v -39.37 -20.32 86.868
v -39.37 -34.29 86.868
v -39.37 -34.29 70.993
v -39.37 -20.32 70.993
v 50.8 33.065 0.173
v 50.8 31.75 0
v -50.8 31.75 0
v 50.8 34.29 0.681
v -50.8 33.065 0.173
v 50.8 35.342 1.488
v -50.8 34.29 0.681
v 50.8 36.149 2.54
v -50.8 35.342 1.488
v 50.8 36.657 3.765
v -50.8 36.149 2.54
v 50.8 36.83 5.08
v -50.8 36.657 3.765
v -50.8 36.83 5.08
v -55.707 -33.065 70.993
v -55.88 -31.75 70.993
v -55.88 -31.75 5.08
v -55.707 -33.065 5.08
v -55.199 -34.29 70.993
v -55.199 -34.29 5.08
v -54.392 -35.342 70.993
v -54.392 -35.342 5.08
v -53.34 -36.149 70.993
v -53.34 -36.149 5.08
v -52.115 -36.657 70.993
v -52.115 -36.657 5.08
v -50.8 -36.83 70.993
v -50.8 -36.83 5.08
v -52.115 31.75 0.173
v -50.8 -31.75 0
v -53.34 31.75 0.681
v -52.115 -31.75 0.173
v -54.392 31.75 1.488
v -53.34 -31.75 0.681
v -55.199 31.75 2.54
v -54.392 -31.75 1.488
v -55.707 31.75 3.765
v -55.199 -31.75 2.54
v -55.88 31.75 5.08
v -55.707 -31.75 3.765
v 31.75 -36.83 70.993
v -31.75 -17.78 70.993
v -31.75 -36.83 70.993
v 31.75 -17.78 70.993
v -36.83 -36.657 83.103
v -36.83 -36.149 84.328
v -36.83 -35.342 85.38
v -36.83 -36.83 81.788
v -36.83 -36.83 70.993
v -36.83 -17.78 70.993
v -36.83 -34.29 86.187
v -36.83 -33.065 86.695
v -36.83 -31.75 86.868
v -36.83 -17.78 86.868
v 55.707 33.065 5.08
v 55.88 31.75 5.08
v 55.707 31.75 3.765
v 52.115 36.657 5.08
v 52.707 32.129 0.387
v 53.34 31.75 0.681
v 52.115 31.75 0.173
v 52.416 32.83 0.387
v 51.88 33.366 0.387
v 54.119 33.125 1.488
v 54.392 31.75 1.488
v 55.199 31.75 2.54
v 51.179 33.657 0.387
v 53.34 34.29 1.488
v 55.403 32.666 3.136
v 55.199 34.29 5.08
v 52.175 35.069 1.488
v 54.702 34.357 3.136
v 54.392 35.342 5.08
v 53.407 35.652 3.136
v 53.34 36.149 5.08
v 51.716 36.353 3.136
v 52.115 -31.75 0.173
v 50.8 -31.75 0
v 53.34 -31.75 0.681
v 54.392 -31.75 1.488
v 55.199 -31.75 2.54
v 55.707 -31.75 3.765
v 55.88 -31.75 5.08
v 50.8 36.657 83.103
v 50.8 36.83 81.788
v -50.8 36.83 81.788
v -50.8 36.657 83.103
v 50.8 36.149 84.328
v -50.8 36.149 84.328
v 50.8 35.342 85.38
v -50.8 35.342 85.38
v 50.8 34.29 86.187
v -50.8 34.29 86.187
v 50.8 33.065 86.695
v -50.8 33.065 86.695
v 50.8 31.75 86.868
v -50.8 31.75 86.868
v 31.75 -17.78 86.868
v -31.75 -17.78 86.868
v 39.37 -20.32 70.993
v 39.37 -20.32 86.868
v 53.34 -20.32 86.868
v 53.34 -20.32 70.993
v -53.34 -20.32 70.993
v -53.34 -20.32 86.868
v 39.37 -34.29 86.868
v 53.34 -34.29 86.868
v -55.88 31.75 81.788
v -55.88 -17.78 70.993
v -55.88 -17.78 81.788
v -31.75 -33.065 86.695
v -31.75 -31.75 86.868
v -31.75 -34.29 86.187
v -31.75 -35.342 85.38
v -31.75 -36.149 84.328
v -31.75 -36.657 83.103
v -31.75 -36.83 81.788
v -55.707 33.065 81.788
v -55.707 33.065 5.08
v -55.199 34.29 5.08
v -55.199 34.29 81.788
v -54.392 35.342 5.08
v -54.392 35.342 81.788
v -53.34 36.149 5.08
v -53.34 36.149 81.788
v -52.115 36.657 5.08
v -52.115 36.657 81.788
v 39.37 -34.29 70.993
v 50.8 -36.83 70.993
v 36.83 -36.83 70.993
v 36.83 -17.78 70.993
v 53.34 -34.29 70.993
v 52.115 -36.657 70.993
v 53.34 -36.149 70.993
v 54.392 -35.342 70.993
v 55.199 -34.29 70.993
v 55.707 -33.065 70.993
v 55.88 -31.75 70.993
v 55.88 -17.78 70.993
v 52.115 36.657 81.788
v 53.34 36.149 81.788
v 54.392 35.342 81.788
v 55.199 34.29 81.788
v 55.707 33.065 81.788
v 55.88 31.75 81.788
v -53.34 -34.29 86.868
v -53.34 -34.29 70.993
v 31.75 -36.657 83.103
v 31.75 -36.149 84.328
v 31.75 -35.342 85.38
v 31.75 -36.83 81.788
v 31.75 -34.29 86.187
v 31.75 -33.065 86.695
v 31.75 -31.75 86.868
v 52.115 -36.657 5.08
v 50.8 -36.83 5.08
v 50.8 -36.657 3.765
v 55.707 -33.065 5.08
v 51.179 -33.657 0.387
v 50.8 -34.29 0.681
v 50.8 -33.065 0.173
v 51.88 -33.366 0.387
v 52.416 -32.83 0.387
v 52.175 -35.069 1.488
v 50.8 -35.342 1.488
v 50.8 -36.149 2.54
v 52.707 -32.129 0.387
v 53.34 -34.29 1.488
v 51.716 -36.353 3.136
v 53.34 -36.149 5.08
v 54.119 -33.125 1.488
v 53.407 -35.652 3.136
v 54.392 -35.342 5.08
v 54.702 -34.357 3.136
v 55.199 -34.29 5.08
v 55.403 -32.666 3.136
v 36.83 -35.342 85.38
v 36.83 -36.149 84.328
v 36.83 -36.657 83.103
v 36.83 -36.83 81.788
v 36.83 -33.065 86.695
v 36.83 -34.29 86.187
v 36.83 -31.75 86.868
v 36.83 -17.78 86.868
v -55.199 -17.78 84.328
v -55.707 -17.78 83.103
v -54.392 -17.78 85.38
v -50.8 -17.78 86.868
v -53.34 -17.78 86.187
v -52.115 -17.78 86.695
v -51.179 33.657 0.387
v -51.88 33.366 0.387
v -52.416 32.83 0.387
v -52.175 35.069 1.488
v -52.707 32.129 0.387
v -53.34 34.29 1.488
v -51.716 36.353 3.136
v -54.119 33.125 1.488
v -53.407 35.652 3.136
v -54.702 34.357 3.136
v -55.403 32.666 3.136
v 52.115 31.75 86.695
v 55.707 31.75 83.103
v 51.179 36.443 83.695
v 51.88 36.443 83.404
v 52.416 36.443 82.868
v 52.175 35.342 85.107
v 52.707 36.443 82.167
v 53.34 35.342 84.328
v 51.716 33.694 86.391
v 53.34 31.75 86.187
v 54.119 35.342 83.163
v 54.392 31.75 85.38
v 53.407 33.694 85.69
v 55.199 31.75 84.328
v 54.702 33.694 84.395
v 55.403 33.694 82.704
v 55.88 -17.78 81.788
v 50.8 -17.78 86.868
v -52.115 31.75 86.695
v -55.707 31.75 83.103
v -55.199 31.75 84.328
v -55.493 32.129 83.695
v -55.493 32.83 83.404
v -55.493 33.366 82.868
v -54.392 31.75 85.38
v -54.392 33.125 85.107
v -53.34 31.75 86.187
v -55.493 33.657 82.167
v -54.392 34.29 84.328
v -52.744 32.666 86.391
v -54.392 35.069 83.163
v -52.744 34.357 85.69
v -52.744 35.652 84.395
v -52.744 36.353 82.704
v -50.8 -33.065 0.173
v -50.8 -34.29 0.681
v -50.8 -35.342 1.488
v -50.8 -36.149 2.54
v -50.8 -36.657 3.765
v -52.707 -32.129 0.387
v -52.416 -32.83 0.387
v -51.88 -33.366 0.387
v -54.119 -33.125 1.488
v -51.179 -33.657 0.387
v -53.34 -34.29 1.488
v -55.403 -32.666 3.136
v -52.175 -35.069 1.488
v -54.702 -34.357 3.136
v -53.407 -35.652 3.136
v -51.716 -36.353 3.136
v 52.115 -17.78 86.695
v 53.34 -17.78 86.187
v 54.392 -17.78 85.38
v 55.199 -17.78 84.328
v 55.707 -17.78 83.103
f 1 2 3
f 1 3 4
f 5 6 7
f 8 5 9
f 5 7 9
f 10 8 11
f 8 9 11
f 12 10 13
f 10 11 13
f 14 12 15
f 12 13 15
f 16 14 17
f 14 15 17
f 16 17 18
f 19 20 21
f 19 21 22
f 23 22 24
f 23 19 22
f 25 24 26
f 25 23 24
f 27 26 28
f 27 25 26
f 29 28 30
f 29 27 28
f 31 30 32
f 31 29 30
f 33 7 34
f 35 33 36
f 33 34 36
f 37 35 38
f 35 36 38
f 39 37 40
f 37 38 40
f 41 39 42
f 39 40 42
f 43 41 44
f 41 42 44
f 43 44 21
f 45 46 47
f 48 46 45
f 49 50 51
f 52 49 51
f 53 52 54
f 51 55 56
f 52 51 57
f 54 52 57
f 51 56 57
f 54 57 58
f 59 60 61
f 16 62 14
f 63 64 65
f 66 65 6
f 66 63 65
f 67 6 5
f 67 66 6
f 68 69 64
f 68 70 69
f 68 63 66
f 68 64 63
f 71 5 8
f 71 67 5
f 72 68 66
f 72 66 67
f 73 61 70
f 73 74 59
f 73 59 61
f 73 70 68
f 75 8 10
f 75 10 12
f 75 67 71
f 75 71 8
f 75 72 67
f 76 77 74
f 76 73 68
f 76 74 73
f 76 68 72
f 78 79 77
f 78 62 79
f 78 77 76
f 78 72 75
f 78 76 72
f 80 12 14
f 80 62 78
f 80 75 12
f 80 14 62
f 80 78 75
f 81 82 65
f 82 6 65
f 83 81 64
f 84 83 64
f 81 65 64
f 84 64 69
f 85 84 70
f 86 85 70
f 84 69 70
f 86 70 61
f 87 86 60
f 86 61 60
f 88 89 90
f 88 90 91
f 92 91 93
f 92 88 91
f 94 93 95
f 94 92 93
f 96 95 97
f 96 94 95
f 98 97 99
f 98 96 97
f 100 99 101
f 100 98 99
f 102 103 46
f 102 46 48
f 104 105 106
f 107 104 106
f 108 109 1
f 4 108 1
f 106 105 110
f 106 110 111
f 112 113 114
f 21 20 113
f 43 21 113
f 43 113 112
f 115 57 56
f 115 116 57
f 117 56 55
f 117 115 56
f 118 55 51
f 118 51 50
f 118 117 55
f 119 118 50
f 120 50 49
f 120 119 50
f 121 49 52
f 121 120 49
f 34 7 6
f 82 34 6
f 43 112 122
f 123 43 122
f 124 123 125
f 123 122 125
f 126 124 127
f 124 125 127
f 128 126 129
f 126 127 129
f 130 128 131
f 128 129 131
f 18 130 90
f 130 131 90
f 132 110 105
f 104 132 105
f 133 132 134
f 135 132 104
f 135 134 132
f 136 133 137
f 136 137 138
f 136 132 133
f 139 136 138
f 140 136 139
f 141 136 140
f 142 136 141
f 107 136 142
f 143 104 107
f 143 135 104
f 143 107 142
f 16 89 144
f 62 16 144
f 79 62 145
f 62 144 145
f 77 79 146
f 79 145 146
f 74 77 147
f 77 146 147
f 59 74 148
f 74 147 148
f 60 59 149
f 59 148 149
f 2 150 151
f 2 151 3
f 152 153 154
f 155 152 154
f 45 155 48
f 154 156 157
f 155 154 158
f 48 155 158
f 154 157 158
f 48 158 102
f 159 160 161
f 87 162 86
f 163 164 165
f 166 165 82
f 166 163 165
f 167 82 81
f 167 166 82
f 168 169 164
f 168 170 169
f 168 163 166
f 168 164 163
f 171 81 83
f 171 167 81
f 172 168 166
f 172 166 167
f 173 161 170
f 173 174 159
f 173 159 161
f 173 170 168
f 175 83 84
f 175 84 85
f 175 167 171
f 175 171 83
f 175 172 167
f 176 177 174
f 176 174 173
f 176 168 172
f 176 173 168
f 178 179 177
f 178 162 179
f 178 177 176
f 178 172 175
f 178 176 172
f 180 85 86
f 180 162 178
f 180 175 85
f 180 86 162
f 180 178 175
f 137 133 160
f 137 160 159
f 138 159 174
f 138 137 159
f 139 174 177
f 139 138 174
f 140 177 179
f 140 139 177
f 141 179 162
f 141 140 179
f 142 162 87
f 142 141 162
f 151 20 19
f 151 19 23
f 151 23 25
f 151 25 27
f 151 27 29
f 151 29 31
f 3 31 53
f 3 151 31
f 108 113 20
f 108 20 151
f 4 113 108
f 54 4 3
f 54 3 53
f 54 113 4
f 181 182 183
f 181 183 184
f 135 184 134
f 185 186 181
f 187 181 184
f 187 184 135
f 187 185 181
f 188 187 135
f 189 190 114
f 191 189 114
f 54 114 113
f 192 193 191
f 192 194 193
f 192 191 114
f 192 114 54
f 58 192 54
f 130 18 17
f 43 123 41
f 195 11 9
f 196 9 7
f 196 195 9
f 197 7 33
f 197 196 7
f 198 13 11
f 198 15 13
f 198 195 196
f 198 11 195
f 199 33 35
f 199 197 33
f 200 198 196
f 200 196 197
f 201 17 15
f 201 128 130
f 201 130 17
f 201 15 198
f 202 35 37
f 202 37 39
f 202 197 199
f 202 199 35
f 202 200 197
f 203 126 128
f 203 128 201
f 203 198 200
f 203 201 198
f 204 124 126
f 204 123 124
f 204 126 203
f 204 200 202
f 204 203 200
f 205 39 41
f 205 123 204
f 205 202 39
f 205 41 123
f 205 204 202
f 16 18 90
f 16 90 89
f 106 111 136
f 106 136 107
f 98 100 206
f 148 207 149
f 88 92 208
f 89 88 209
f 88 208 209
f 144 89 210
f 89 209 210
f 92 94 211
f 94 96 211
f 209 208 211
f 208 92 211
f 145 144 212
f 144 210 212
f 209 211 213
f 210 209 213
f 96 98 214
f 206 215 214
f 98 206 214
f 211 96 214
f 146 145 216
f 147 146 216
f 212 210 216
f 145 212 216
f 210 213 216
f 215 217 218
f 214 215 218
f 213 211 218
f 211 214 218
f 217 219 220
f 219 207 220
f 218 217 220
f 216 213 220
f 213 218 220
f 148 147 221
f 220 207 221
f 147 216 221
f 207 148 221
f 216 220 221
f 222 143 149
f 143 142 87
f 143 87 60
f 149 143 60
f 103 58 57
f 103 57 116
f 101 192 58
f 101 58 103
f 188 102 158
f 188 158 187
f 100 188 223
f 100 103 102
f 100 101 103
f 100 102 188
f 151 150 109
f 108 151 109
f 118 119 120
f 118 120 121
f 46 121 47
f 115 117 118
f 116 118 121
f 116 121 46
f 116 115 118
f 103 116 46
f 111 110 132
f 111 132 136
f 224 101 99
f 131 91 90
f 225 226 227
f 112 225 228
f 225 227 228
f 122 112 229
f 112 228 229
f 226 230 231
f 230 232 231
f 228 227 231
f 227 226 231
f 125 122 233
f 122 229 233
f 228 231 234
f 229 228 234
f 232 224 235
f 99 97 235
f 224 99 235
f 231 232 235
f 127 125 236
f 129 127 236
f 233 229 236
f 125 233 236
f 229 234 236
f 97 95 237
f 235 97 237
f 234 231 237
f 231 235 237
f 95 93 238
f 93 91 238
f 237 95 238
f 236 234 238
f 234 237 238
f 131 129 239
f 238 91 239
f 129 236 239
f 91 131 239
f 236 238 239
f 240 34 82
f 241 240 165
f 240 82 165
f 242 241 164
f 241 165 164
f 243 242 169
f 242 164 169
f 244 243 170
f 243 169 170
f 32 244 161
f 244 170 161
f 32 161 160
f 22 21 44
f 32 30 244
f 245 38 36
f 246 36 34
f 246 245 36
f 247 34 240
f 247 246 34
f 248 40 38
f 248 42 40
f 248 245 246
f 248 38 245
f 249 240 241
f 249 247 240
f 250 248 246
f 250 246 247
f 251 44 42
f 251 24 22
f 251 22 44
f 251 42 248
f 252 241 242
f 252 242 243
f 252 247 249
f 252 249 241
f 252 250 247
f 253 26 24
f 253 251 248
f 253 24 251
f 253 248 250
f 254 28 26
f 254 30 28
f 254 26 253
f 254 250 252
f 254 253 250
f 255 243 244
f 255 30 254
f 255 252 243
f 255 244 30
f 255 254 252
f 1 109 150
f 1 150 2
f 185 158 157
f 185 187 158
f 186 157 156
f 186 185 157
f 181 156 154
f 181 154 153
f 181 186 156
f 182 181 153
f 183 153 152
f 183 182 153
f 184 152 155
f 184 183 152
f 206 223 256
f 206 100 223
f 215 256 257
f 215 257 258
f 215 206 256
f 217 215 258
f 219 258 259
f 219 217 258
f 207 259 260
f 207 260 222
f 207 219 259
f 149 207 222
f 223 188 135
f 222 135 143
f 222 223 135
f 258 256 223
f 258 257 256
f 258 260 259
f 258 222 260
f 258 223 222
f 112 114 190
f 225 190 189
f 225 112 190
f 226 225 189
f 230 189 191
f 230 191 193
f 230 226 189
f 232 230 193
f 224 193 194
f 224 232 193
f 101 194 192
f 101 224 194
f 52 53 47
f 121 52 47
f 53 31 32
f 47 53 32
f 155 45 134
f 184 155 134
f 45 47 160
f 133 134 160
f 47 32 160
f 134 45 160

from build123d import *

# Parameters (mm, degrees)
F0_W     = 111.76
F0_H     = 73.66
F1_DEPTH = 86.868
F2_W     = 19.05
F2_H     = 19.05
F2_W_2   = 13.97
F2_H_2   = 13.97
F2_W_3   = 63.5
F3_DEPTH = 15.875
F4_R     = 5.08
F5_R     = 5.08


with BuildPart() as f1:
    # F0 (on Top) → F1 (new body)
    with BuildSketch(Plane.XY):
        Rectangle(F0_W, F0_H)
    extrude(amount=F1_DEPTH)

    # F2 (on face) → F3 (cut)
    with BuildSketch(Plane.XY.offset(86.868)):
        with Locations((-46.355, -27.305)):
            Rectangle(F2_W, F2_H)
        with Locations((-46.355, -27.305)):
            Rectangle(F2_W_2, F2_H_2, mode=Mode.SUBTRACT)
        with Locations((0, -27.305)):
            Rectangle(F2_W_3, F2_H)
        with Locations((46.355, -27.305)):
            Rectangle(F2_W, F2_H)
        with Locations((46.355, -27.305)):
            Rectangle(F2_W_2, F2_H_2, mode=Mode.SUBTRACT)
    extrude(amount=-F3_DEPTH, mode=Mode.SUBTRACT)

    # F4
    f4_edges = [f1.edges().sort_by_distance(p)[0] for p in [
        (34.29, -36.83, 86.868),
        (-34.29, -36.83, 86.868),
        (55.88, 9.525, 86.868),
        (0, 36.83, 86.868),
        (-55.88, 9.525, 86.868),
        (-55.88, -36.83, 35.4965),
        (55.88, -36.83, 35.4965),
        (55.88, 36.83, 43.434),
        (-55.88, 36.83, 43.434),
    ]]
    fillet(f4_edges, radius=F4_R)

    # F5
    f5_edges = [f1.edges().sort_by_distance(p)[0] for p in [
        (55.88, 0, 0),
        (54.392102, -35.342102, 0),
        (54.392102, 35.342102, 0),
        (0, -36.83, 0),
        (0, 36.83, 0),
        (-54.392102, -35.342102, 0),
        (-54.392102, 35.342102, 0),
        (-55.88, 0, 0),
    ]]
    fillet(f5_edges, radius=F5_R)


solid = f1.part
